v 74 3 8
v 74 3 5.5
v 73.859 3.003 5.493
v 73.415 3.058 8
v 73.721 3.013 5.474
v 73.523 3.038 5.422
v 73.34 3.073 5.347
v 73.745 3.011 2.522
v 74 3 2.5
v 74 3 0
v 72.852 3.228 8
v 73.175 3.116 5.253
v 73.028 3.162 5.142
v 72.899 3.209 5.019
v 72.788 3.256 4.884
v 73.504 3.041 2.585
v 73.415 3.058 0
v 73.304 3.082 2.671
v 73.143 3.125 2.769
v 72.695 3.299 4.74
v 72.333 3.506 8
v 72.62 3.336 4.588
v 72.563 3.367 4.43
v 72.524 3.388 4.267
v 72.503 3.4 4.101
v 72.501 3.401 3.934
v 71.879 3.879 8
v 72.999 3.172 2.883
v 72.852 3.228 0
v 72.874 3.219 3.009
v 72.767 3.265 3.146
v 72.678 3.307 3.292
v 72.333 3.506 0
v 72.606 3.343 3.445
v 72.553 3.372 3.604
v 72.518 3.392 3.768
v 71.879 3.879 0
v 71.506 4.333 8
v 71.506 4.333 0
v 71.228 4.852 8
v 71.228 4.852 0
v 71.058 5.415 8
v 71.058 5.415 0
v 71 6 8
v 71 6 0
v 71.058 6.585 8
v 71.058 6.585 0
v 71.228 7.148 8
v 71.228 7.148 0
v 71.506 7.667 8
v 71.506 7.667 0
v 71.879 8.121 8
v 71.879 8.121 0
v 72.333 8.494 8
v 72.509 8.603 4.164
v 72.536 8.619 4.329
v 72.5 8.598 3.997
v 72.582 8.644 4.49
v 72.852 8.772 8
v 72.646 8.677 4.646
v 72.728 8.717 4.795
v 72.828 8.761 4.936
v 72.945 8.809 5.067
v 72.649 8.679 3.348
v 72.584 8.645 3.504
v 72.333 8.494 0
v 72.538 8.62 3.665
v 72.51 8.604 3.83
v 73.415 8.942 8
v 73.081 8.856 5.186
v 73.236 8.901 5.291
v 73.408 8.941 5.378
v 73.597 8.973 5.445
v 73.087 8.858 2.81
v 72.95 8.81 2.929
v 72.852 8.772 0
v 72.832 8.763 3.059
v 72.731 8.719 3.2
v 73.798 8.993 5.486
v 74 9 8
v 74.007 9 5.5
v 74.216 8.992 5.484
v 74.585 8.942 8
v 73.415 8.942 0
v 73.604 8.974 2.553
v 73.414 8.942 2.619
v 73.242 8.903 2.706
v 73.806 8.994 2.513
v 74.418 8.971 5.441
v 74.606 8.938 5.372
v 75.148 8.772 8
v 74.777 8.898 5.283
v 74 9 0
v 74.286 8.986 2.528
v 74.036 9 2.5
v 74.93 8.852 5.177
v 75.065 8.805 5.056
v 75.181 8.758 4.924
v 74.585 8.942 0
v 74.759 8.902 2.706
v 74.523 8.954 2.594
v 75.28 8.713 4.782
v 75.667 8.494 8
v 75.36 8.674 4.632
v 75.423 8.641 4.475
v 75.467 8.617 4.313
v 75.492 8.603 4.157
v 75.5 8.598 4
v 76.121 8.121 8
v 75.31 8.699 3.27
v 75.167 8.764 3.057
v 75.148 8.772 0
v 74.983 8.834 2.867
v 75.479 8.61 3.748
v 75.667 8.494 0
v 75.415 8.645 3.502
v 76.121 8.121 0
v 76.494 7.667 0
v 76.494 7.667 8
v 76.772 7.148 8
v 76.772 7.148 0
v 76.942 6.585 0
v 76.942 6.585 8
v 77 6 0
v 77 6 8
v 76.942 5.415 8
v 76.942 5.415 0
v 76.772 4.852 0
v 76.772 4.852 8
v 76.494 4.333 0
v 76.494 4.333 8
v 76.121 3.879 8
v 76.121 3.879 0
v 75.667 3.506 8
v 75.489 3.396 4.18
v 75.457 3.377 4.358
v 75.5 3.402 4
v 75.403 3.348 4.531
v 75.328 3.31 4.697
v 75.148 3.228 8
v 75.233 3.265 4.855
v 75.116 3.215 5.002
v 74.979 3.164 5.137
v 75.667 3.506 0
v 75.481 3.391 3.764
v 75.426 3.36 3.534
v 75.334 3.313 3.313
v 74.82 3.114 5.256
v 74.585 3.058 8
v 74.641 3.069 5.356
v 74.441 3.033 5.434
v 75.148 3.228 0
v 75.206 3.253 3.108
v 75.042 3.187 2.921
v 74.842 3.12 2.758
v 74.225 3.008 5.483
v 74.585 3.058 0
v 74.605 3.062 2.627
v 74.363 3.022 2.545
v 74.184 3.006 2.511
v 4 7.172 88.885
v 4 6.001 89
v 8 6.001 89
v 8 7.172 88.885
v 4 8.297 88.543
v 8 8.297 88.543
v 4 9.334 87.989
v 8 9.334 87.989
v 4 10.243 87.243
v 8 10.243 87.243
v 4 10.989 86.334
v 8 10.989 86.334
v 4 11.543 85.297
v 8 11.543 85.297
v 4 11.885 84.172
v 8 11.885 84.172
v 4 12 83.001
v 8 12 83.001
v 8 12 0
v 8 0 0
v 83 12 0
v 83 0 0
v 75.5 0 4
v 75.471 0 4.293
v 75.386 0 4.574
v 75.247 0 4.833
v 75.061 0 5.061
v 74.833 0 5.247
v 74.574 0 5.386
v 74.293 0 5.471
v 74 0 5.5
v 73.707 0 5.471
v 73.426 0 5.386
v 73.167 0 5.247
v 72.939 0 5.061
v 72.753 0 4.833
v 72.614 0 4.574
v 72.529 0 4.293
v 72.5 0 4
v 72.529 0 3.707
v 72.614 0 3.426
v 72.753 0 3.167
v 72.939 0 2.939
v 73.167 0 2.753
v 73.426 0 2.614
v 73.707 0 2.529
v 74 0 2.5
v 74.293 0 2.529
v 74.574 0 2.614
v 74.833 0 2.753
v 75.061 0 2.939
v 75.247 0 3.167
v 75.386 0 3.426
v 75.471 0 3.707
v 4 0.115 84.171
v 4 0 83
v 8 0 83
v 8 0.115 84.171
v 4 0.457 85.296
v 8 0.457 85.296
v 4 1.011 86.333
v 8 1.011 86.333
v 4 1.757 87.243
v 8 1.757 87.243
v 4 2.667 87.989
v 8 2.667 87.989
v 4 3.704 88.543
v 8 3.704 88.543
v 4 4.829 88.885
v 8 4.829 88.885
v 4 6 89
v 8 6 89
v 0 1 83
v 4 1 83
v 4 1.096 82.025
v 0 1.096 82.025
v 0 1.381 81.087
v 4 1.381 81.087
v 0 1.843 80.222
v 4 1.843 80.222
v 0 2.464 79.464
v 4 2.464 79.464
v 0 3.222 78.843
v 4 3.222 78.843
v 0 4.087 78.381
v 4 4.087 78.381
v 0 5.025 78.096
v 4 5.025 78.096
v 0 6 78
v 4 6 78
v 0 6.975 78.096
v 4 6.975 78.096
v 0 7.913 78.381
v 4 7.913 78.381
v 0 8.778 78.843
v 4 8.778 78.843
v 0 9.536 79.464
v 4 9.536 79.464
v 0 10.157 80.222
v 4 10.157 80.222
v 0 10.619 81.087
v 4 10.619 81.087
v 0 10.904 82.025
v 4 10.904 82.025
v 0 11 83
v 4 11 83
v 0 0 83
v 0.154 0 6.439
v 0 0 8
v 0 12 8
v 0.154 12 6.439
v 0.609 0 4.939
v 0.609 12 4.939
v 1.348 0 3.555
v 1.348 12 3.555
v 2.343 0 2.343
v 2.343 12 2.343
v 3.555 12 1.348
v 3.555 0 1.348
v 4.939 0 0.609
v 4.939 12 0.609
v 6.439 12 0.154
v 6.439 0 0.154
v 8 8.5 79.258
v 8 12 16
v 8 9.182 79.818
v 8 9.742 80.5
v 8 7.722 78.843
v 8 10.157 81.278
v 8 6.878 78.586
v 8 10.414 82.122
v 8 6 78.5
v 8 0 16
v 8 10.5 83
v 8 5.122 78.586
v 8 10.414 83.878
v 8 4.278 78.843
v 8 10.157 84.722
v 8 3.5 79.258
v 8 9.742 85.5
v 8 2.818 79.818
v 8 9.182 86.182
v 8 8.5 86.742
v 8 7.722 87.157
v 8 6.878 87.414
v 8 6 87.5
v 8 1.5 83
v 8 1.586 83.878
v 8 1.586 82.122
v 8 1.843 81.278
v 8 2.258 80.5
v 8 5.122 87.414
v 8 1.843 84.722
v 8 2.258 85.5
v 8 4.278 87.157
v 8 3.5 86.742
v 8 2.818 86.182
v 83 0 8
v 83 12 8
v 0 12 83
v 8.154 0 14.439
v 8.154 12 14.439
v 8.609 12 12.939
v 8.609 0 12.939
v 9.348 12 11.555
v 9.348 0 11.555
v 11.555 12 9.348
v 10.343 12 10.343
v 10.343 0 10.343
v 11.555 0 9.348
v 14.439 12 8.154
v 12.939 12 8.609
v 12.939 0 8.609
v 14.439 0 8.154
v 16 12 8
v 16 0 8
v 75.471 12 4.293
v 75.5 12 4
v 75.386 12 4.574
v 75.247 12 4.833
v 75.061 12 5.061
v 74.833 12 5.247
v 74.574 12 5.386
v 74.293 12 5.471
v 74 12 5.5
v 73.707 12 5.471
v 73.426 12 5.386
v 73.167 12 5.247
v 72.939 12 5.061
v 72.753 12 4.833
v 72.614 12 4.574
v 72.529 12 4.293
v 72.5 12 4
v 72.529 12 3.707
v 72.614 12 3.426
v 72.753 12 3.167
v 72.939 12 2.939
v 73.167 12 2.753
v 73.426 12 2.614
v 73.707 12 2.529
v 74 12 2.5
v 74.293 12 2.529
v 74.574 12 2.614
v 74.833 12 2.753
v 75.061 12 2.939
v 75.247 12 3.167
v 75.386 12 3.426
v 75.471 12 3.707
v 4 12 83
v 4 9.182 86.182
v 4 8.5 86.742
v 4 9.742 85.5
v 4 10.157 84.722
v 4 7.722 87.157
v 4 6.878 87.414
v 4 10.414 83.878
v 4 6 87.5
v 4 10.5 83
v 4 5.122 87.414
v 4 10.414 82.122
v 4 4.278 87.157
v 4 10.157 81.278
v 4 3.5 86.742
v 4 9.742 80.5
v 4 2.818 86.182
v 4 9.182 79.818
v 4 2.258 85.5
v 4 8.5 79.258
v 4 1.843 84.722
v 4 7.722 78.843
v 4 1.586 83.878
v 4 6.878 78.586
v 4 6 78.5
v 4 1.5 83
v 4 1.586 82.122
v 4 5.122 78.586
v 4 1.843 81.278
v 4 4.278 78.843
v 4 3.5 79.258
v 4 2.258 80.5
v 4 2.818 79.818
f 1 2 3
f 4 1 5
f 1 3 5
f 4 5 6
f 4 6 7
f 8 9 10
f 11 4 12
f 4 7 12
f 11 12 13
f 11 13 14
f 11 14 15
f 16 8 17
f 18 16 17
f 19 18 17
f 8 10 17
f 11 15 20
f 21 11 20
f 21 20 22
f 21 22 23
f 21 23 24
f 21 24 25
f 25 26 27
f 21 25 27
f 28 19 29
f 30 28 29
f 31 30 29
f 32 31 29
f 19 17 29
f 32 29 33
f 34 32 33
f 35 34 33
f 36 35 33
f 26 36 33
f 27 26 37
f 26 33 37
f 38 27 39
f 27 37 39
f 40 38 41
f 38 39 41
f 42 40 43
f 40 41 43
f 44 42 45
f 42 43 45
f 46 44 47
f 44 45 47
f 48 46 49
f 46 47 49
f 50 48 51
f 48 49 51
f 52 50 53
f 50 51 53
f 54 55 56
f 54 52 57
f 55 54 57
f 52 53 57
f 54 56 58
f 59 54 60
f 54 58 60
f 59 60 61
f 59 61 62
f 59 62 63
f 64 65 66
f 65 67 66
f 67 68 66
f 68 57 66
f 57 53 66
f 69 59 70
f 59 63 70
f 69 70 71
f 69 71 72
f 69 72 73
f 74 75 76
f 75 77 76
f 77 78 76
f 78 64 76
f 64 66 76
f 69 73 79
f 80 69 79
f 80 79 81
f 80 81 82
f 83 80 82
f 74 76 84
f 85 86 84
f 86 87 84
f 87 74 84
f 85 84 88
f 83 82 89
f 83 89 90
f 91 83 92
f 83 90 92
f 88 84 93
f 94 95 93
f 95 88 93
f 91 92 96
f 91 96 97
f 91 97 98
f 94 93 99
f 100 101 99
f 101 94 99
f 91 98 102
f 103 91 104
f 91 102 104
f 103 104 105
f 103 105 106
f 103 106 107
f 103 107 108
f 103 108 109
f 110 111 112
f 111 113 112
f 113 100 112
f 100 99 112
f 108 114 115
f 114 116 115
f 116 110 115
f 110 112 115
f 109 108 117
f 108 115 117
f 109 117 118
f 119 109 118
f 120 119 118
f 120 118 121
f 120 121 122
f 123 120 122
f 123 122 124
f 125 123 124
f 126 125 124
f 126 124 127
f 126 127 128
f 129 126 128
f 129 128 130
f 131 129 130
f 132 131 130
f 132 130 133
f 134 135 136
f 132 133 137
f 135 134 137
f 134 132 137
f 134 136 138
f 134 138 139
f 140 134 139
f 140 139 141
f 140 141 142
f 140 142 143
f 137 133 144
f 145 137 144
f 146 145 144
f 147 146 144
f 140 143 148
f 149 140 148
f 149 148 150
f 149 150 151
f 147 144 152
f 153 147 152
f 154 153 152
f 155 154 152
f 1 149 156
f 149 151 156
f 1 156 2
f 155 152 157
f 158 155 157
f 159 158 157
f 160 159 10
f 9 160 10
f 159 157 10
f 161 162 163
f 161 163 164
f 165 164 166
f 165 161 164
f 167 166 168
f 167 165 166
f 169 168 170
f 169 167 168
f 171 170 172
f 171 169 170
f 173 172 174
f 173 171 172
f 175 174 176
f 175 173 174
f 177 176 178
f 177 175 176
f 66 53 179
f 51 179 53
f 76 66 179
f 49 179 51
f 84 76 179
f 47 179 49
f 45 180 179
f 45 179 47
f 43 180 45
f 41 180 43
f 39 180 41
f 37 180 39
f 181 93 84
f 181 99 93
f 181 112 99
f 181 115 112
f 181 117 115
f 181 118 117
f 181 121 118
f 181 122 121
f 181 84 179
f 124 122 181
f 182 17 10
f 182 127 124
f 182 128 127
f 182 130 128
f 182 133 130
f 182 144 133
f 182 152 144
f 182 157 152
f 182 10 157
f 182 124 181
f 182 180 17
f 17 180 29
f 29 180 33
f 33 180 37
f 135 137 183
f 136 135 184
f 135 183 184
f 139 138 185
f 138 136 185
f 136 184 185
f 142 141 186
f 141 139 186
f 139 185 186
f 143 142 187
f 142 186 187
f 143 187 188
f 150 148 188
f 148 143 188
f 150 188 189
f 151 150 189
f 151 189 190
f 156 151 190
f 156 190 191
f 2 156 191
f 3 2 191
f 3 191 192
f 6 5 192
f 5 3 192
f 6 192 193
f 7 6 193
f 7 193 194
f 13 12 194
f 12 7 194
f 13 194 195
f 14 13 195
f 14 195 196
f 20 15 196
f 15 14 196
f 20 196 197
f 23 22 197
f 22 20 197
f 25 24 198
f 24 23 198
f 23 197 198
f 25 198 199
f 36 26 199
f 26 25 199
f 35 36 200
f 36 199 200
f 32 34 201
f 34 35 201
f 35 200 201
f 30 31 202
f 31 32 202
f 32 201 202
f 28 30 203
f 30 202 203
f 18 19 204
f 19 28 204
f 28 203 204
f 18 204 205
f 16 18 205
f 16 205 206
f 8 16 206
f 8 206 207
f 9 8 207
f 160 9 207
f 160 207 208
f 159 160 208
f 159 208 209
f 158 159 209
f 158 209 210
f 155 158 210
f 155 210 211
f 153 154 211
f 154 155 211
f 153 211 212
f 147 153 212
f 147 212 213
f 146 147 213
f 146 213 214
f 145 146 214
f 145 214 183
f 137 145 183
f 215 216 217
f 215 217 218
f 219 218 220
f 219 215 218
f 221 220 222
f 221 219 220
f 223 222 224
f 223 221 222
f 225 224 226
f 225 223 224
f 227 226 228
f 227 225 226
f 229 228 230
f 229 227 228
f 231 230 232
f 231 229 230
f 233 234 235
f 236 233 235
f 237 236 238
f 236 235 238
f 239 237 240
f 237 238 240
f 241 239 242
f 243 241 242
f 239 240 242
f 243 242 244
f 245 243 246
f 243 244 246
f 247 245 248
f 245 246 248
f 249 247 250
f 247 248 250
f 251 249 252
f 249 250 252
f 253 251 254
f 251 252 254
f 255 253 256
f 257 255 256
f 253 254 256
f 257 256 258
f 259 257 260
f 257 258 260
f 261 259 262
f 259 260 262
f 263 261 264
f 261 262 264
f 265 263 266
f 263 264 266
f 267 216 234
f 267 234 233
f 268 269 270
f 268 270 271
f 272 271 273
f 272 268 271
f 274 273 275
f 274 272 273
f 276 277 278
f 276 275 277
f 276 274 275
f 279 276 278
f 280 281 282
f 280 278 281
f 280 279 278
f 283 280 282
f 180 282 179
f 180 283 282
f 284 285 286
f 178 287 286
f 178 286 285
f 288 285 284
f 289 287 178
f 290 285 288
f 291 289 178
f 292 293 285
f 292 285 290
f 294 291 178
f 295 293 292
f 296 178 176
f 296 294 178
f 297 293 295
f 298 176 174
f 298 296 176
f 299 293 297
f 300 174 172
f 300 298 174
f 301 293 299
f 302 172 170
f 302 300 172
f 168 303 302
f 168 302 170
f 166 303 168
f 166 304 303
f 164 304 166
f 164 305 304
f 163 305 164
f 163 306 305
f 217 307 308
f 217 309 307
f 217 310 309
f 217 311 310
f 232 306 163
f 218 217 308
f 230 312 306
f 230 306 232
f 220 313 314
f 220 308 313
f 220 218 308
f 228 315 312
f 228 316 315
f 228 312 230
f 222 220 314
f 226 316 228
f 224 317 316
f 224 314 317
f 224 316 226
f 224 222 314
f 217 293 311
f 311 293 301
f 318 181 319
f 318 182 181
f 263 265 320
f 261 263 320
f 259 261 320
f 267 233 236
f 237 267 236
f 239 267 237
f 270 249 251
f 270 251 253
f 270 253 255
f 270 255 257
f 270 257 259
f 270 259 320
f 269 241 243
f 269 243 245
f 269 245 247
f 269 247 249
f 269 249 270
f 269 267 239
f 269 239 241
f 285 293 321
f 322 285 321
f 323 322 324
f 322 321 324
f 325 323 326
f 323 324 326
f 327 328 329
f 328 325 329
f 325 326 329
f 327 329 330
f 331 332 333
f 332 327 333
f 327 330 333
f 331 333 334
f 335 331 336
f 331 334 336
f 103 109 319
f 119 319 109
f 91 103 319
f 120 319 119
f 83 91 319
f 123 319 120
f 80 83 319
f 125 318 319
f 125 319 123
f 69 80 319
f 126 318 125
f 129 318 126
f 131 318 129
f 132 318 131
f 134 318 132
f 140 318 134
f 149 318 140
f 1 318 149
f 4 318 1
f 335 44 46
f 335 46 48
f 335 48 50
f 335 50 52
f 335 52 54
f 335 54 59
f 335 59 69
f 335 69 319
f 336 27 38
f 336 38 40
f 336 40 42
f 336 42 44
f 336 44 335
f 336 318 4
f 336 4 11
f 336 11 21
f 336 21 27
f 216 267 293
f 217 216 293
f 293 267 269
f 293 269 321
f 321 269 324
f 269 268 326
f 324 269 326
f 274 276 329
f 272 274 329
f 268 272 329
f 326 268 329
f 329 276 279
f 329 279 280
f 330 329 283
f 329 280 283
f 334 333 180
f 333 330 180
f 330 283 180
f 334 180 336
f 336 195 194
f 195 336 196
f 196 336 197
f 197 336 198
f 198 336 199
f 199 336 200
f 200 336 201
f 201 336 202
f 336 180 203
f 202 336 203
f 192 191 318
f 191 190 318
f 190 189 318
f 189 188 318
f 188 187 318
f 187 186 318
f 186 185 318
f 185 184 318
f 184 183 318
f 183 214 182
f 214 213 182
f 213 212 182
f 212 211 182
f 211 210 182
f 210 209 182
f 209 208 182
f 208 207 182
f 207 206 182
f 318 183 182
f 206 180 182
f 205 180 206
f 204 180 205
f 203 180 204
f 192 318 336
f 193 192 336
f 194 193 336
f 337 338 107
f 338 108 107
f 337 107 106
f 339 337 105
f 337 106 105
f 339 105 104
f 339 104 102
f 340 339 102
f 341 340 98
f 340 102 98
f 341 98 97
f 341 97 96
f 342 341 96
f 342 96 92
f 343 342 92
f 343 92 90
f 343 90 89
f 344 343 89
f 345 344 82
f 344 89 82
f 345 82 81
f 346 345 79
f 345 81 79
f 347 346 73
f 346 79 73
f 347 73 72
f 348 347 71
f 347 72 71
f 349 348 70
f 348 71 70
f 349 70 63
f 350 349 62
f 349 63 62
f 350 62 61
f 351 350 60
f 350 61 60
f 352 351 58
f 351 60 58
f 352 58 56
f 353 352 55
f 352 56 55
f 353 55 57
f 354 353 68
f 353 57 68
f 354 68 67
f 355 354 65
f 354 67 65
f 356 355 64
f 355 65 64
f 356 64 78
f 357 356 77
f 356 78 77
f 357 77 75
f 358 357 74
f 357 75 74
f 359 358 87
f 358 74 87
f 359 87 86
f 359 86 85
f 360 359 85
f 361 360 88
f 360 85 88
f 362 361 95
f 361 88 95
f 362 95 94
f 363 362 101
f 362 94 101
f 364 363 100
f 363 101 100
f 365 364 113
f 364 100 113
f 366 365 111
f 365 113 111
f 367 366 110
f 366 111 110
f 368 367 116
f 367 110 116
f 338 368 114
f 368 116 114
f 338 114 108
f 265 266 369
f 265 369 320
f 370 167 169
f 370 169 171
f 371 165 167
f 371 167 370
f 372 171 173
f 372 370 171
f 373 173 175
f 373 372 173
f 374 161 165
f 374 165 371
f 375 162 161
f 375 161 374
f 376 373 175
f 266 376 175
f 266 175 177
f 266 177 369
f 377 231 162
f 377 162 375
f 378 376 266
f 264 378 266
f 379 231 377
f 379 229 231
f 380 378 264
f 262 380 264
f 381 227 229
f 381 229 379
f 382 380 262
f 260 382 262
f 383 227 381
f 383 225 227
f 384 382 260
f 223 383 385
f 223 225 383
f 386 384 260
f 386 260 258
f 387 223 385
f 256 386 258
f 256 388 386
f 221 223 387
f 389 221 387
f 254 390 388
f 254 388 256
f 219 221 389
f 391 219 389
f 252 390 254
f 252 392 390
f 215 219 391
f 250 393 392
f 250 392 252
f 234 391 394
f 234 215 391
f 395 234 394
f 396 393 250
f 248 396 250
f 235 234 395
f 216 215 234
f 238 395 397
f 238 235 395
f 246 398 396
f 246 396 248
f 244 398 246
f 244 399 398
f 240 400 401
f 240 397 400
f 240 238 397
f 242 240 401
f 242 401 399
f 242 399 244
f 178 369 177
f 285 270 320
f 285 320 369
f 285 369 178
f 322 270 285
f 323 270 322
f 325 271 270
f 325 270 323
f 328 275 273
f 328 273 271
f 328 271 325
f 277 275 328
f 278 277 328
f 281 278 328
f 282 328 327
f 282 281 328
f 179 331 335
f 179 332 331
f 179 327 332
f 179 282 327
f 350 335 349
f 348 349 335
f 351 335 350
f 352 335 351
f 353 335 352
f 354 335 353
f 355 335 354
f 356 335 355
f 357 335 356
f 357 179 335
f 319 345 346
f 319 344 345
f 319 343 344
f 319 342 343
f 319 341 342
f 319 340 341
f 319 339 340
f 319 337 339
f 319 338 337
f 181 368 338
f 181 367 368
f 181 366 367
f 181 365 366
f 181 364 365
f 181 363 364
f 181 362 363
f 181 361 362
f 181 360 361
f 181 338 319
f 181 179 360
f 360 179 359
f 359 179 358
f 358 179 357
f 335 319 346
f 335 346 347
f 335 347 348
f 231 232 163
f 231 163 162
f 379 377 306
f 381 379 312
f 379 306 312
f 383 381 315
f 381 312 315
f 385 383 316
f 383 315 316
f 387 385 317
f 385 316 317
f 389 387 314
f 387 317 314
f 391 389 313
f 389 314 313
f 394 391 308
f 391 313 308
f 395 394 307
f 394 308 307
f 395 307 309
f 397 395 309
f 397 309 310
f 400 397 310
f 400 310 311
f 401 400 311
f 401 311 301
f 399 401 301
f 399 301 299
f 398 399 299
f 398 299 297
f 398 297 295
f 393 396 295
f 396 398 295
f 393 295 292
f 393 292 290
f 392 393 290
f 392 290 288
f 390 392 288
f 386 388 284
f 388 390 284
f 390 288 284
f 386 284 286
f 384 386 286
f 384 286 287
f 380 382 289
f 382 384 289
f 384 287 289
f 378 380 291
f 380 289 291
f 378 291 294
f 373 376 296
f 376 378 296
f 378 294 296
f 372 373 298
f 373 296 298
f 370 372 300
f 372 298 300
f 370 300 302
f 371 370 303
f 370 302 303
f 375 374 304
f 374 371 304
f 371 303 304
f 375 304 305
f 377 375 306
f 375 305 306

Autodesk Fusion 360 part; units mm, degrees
sketch "Sketch1" plane through (0, 0, 0) normal (0, 1, 0) x (1, 0, 0)
  line L0 (8, 0) -> (83, 0)
  line L1 (83, 0) -> (83, -8)
  line L2 (83, -8) -> (16, -8)
  line L3 (8, -16) -> (8, -89)
  line L4 (8, -89) -> (4, -89)
  line L5 (4, -89) -> (4, -83)
  line L6 (4, -83) -> (0, -83)
  line L7 (0, -83) -> (0, -8)
  arc A0 (16, -8) -> (8, -16) centre (16, -16) ccw
  arc A1 (8, 0) -> (0, -8) centre (8, -8) ccw
  line L8 (74, 0) -> (74, -4) construction
  circle A2 centre (74, -4) radius 1.5
  dimension "d1" = 83
  dimension "d2" = 8
  dimension "d3" = 4
  dimension "d4" = 8
  dimension "d5" = 8
  dimension "d6" = 8
  dimension "d7" = 89
  dimension "d8" = 83
  dimension "d9" = 75
  dimension "d11" = 4
  dimension "d12" = 3
  dimension "d13" = 66
extrude "Extrude1" add sketch "Sketch1" along normal blind 12
fillet "Fillet1" radius 6 1 edges at (6, 0, 89)
fillet "Fillet2" radius 6 1 edges at (6, 12, 89)
sketch "Sketch2" plane through (0, 0, 0) normal (1, 0, 0) x (0, 1, 0)
  arc A0 (12, 83) -> (0, 83) centre (6, 83) ccw
  line L0 (0, 83) -> (0, 16)
  line L1 (0, 16) -> (12, 16)
  line L2 (12, 16) -> (12, 83)
  line L3 (6, 16) -> (6, 83) construction
  circle A1 centre (6, 83) radius 4.5
  line L4 (0, 8) -> (0, 83)
  line L5 (0, 83) -> (12, 83)
  line L6 (12, 83) -> (12, 8)
  line L7 (12, 8) -> (0, 8)
  dimension "d20" = 67
  dimension "d21" = 9
hole "Hole1" at (0, 6, 83) direction (1, 0, 0) diameter 9 depth 13 tip angle 118 counterbore diameter 10 counterbore depth 4
sketch "Sketch3" plane through (0, 0, 8) normal (0, 0, 1) x (-1, 0, 0)
  line L0 (-16, 0) -> (-83, 0)
  line L1 (-83, 0) -> (-83, -12)
  line L2 (-83, -12) -> (-16, -12)
  line L3 (-16, -12) -> (-16, 0)
  line L4 (-83, -6) -> (-74, -6) construction
  circle A0 centre (-74, -6) radius 3
  dimension "d27" = 9
  dimension "d28" = 6
hole "Hole2" at (74, 6, 8) direction (0, 0, -1) diameter 6 depth 13 tip angle 118
